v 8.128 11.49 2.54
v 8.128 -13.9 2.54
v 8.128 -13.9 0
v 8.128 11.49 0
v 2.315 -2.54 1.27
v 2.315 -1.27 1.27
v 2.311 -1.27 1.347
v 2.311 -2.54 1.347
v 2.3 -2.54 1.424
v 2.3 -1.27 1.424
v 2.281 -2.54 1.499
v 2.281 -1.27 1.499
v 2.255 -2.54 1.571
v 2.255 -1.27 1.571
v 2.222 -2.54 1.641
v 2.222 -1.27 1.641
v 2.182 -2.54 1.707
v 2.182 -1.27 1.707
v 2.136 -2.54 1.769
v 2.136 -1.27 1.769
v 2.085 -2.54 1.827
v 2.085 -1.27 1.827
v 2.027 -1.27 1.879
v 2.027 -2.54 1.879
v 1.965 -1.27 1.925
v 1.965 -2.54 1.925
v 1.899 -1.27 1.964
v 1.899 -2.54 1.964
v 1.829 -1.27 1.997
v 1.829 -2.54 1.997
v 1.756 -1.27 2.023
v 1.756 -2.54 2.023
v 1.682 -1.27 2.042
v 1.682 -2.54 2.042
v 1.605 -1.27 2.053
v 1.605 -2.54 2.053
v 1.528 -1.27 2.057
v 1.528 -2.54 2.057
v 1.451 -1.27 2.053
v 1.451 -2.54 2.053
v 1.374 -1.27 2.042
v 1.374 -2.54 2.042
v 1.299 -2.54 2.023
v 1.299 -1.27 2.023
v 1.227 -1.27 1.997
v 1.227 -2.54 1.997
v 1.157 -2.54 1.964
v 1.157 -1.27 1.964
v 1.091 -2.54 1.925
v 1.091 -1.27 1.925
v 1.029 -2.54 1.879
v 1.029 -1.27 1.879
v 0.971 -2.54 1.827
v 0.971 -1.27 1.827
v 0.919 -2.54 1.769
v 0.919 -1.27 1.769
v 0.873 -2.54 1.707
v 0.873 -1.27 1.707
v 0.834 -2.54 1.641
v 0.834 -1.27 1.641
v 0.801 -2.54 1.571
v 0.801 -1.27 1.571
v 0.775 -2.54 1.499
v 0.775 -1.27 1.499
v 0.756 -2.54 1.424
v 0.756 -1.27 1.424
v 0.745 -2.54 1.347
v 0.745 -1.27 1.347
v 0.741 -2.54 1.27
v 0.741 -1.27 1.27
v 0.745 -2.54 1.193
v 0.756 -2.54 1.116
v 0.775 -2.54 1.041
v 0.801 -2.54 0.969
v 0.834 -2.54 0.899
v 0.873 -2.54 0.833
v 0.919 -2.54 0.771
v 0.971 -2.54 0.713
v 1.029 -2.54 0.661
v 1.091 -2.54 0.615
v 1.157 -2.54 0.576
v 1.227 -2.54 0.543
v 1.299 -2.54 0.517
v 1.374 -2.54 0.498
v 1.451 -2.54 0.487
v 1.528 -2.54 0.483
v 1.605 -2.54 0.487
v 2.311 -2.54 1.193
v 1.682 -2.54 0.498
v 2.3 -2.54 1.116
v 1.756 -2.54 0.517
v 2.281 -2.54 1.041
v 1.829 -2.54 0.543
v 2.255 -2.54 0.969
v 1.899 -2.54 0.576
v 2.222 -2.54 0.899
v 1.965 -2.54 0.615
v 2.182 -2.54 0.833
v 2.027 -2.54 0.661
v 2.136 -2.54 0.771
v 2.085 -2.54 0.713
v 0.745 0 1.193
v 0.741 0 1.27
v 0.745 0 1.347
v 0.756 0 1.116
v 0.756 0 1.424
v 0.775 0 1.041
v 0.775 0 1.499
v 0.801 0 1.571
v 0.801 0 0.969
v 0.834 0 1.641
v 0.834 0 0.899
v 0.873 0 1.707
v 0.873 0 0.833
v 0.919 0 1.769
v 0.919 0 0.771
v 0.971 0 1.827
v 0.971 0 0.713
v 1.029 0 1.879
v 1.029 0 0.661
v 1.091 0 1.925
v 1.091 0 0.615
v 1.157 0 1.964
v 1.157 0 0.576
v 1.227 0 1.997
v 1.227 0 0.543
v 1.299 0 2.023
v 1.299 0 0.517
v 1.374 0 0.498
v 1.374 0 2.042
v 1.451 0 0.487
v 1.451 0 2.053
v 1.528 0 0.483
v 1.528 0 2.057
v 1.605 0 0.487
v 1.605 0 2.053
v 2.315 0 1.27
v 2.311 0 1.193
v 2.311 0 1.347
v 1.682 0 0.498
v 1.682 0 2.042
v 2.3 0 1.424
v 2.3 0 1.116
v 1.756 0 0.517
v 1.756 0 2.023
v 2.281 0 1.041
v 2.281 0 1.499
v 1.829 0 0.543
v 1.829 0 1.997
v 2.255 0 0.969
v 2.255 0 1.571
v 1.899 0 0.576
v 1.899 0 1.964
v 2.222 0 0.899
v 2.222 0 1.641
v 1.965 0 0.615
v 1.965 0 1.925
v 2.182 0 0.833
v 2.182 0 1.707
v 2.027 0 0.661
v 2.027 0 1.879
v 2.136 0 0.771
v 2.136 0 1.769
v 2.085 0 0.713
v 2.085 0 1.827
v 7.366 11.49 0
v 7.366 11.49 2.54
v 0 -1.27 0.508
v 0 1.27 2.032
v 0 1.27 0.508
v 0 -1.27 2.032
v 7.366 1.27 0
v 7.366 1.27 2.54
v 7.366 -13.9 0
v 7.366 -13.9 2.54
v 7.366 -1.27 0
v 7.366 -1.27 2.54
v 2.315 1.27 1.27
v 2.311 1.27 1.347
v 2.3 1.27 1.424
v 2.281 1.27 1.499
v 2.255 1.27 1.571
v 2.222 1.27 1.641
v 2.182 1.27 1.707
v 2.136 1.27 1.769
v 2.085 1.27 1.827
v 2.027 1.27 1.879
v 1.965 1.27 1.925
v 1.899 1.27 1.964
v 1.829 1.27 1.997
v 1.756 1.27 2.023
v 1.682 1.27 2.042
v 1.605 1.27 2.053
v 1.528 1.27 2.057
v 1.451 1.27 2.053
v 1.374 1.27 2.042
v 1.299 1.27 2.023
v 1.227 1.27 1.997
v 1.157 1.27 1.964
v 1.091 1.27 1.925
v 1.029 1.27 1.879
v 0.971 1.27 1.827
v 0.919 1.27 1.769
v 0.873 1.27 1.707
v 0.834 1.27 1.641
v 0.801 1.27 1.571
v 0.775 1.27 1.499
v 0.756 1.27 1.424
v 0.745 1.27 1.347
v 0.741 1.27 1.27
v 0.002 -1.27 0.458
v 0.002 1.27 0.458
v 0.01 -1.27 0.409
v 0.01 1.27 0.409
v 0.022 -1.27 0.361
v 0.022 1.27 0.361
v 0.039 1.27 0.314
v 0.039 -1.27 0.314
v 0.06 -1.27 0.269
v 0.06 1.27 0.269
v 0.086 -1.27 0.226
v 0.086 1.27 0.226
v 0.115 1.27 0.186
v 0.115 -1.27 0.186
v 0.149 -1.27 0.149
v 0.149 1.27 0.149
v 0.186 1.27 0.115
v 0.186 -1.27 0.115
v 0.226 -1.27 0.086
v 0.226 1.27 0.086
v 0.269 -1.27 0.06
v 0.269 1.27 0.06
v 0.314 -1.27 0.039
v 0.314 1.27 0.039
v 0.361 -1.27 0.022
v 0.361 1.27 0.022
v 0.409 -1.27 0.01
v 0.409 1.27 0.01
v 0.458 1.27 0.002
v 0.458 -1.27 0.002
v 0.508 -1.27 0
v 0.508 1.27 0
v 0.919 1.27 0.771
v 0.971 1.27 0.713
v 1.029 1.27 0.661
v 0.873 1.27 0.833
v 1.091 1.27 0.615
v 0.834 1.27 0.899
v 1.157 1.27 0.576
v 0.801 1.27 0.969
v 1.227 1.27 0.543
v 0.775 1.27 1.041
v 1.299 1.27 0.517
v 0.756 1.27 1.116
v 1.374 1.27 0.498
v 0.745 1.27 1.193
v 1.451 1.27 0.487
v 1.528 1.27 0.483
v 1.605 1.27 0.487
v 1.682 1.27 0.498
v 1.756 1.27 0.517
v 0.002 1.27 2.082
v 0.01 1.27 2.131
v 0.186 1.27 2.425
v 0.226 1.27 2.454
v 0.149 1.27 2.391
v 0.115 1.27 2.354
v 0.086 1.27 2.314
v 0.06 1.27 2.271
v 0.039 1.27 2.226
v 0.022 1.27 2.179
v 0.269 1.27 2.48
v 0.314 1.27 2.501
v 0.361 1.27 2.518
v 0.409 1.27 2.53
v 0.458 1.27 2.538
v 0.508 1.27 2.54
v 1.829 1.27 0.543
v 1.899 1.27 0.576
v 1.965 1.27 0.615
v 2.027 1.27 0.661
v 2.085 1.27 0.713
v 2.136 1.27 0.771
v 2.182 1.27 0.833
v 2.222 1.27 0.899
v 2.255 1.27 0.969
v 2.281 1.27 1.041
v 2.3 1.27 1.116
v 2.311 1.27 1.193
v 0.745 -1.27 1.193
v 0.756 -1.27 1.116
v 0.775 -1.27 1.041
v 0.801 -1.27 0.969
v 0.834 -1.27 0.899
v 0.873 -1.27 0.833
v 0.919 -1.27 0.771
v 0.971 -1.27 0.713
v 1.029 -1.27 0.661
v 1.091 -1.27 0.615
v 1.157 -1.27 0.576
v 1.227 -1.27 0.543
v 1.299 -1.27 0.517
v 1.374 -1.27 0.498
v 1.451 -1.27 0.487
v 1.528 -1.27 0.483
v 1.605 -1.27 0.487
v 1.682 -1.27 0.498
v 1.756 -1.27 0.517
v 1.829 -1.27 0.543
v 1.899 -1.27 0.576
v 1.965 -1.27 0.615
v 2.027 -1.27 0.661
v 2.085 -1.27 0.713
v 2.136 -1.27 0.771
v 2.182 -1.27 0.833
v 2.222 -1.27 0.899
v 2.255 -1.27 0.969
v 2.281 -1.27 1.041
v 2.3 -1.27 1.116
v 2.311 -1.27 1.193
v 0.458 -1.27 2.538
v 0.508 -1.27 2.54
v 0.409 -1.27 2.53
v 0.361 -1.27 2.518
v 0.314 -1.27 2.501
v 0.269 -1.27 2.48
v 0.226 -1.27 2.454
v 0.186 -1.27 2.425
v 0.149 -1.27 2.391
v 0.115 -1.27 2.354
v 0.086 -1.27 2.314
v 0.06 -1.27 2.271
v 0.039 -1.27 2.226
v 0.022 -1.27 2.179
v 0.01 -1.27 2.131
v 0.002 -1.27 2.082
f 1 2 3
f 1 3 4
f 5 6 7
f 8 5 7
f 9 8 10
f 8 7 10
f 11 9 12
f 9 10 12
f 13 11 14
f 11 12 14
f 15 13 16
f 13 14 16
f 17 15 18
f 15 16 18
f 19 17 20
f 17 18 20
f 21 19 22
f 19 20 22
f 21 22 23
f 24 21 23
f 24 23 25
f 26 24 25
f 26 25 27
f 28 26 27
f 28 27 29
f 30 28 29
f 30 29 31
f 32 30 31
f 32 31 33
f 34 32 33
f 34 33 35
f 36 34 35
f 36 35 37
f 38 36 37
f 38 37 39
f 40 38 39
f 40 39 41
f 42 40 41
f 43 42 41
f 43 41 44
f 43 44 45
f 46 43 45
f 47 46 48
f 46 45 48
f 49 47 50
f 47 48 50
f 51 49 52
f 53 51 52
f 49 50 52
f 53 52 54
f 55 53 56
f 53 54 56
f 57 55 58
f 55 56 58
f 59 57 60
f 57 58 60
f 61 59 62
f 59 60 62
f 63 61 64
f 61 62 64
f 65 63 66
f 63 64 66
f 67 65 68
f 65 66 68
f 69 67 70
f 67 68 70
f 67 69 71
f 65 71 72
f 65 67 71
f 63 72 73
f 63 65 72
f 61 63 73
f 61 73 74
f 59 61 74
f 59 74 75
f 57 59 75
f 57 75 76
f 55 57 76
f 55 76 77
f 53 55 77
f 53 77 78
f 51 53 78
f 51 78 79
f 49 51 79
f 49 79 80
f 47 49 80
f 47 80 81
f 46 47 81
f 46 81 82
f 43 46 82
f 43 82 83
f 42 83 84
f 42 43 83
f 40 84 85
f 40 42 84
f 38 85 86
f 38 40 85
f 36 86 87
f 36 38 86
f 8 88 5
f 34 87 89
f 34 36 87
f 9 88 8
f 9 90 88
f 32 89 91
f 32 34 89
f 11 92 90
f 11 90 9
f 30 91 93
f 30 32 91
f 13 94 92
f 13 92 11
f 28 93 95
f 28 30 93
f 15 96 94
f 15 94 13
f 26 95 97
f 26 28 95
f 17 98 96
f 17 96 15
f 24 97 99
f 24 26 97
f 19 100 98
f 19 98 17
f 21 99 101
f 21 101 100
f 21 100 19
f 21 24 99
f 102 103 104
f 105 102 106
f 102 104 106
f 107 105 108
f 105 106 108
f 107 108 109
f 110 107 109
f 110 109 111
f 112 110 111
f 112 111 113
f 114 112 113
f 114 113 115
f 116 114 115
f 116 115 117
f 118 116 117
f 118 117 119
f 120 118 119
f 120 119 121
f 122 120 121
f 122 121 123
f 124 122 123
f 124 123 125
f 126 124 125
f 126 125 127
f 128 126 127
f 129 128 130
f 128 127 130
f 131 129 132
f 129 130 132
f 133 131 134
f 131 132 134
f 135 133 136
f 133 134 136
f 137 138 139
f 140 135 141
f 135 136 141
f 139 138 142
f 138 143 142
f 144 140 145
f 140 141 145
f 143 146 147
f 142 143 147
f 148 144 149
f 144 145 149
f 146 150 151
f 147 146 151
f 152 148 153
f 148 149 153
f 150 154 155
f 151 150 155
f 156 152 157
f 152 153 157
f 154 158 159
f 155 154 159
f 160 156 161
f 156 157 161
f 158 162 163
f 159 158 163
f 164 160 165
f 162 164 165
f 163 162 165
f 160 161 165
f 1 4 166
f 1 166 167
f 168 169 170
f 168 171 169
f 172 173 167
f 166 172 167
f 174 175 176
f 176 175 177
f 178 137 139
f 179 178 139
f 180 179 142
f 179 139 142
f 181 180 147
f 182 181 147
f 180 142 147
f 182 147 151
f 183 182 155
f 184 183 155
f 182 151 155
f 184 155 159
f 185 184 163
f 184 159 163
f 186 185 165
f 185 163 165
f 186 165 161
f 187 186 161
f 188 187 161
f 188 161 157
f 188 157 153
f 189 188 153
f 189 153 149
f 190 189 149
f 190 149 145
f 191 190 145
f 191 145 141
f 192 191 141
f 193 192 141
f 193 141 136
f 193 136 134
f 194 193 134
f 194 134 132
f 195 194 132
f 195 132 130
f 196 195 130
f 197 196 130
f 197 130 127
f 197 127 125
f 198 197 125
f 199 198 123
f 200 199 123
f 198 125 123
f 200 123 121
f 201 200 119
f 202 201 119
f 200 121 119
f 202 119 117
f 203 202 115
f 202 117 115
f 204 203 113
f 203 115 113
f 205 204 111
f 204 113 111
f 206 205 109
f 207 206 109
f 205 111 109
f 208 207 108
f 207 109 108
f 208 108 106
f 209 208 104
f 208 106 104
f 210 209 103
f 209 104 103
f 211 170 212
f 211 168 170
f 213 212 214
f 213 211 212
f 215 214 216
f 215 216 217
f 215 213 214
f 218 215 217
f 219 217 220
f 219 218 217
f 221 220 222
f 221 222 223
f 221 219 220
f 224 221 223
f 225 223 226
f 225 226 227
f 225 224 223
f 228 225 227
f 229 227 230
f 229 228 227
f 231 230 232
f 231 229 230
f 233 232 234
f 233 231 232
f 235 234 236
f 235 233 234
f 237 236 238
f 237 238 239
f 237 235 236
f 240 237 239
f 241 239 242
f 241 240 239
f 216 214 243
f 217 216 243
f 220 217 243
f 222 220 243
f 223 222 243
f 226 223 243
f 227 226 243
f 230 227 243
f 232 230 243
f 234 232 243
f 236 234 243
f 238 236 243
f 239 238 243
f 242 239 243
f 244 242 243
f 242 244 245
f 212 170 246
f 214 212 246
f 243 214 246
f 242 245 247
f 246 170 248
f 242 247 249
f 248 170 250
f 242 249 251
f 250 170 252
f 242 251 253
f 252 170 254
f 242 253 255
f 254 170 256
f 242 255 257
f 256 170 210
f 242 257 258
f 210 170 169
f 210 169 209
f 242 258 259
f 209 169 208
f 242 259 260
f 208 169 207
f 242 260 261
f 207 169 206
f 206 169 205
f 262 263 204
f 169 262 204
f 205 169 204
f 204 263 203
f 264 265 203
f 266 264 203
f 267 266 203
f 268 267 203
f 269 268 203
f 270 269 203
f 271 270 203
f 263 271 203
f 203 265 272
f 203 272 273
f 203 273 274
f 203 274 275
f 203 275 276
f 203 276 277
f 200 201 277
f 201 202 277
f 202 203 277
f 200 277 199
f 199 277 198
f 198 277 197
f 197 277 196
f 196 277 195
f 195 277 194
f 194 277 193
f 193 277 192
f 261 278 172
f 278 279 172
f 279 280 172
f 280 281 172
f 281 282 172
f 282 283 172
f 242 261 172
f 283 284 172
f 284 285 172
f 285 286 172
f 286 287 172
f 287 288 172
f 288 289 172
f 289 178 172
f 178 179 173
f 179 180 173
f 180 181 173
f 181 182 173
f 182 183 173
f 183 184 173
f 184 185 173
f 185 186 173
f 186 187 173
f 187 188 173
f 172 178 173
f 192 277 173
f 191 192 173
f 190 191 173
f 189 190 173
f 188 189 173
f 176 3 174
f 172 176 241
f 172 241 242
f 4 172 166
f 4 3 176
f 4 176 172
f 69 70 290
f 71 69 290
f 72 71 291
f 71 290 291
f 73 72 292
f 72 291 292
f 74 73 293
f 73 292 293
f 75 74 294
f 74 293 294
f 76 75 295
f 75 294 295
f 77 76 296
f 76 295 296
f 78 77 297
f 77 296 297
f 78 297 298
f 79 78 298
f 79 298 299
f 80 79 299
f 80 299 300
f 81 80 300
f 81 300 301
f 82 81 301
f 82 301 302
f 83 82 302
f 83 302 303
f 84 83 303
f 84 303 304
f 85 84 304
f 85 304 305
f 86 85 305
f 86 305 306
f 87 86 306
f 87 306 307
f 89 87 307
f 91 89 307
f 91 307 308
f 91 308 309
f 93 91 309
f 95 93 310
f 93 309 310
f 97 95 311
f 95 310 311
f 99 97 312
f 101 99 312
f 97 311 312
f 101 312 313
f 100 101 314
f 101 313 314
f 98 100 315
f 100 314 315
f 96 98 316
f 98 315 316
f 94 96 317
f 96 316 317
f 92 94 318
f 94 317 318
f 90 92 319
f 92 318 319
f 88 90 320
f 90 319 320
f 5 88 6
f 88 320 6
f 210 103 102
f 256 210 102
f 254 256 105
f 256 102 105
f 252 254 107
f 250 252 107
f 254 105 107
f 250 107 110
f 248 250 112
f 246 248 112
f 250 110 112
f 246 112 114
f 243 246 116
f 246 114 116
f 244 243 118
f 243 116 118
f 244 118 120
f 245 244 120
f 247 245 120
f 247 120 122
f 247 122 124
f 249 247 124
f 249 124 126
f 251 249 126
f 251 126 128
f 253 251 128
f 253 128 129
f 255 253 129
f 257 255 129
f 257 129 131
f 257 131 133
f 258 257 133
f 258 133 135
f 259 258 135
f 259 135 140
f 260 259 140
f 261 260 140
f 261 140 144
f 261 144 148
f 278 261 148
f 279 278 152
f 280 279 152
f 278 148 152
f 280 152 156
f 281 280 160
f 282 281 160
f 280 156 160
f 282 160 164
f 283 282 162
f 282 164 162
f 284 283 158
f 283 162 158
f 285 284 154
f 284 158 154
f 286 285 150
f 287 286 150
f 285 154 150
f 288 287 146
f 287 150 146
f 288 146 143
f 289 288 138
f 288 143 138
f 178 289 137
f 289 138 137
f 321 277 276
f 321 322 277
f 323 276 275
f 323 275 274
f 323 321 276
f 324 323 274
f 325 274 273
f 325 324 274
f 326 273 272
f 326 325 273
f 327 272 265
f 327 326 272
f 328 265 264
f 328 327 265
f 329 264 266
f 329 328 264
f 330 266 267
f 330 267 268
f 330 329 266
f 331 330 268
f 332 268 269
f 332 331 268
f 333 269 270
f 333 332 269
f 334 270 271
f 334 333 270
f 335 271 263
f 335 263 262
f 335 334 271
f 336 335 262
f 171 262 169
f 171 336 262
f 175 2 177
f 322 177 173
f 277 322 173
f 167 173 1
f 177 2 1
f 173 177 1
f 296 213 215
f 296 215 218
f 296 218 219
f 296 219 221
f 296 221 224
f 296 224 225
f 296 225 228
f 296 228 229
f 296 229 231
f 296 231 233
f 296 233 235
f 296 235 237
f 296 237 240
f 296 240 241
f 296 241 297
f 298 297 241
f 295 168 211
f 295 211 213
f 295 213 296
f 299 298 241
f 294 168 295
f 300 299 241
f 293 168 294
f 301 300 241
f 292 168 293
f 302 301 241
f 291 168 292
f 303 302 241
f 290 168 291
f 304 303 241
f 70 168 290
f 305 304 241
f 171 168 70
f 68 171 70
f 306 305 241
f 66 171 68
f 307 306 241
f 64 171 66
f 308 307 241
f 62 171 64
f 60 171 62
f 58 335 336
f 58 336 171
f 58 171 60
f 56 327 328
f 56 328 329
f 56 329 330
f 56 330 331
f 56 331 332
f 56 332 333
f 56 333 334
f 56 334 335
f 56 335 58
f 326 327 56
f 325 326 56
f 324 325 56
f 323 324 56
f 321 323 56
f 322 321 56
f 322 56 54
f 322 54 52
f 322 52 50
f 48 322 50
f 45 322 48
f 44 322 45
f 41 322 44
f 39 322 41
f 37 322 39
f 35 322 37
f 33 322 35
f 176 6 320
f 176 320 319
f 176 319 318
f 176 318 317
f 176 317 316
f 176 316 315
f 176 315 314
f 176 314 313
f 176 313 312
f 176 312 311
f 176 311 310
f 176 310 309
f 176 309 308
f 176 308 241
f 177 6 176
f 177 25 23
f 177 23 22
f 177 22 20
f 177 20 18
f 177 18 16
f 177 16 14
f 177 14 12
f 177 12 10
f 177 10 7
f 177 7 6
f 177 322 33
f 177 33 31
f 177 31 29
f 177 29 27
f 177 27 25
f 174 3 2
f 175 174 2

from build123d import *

# Parameters (mm, degrees)
F1_DEPTH = 1.27
F2_W     = 25.3899591044
F2_H     = 2.54
F3_DEPTH = 0.762
F4_DEPTH = 2.54
F5_DEPTH = 25.4


with BuildPart() as f1:
    # F0 (on Front) → F1 (new body, symmetric)
    with BuildSketch(Plane.XZ):
        with BuildLine():
            ThreePointArc((0, 0.508), (0.1487897552, 0.1487897552), (0.508, 0))
            Line((0.508, 0), (8.128, 0))
            Line((8.128, 0), (8.128, 2.54))
            Line((8.128, 2.54), (0.508, 2.54))
            ThreePointArc((0.508, 2.54), (0.1487897552, 2.3912102448), (0, 2.032))
            Line((0, 2.032), (0, 1.27))
            Line((0, 1.27), (0, 0.508))
        make_face()
        with BuildLine():
            ThreePointArc((2.3151677185, 1.27), (1.5279400395, 0.4827723211), (0.7407123606, 1.27))
            ThreePointArc((0.7407123606, 1.27), (1.5279400395, 2.0572276789), (2.3151677185, 1.27))
        make_face(mode=Mode.SUBTRACT)
        with BuildLine():
            ThreePointArc((2.3151677185, 1.27), (1.5279400395, 2.0572276789), (0.7407123606, 1.27))
            Line((0.7407123606, 1.27), (2.3151677185, 1.27))
        make_face()
        with BuildLine():
            Line((2.3151677185, 1.27), (0.7407123606, 1.27))
            ThreePointArc((0.7407123606, 1.27), (1.5279400395, 0.4827723211), (2.3151677185, 1.27))
        make_face()
    extrude(amount=F1_DEPTH, both=True)

    # F2 (on face) → F3 (join)
    with BuildSketch(Plane.YZ.offset(8.128)):
        with Locations((-1.2046988122, 1.27)):
            Rectangle(F2_W, F2_H)
    extrude(amount=-F3_DEPTH)

    # F0 (on Front) → F4 (join)
    with BuildSketch(Plane.XZ):
        with BuildLine():
            ThreePointArc((2.3151677185, 1.27), (1.5279400395, 2.0572276789), (0.7407123606, 1.27))
            Line((0.7407123606, 1.27), (2.3151677185, 1.27))
        make_face()
        with BuildLine():
            Line((2.3151677185, 1.27), (0.7407123606, 1.27))
            ThreePointArc((0.7407123606, 1.27), (1.5279400395, 0.4827723211), (2.3151677185, 1.27))
        make_face()
    extrude(amount=F4_DEPTH)

    # F0 (on Front) → F5 (cut)
    with BuildSketch(Plane.XZ):
        with BuildLine():
            ThreePointArc((2.3151677185, 1.27), (1.5279400395, 2.0572276789), (0.7407123606, 1.27))
            Line((0.7407123606, 1.27), (2.3151677185, 1.27))
        make_face()
        with BuildLine():
            Line((2.3151677185, 1.27), (0.7407123606, 1.27))
            ThreePointArc((0.7407123606, 1.27), (1.5279400395, 0.4827723211), (2.3151677185, 1.27))
        make_face()
    extrude(amount=-F5_DEPTH, mode=Mode.SUBTRACT)


solid = f1.part
